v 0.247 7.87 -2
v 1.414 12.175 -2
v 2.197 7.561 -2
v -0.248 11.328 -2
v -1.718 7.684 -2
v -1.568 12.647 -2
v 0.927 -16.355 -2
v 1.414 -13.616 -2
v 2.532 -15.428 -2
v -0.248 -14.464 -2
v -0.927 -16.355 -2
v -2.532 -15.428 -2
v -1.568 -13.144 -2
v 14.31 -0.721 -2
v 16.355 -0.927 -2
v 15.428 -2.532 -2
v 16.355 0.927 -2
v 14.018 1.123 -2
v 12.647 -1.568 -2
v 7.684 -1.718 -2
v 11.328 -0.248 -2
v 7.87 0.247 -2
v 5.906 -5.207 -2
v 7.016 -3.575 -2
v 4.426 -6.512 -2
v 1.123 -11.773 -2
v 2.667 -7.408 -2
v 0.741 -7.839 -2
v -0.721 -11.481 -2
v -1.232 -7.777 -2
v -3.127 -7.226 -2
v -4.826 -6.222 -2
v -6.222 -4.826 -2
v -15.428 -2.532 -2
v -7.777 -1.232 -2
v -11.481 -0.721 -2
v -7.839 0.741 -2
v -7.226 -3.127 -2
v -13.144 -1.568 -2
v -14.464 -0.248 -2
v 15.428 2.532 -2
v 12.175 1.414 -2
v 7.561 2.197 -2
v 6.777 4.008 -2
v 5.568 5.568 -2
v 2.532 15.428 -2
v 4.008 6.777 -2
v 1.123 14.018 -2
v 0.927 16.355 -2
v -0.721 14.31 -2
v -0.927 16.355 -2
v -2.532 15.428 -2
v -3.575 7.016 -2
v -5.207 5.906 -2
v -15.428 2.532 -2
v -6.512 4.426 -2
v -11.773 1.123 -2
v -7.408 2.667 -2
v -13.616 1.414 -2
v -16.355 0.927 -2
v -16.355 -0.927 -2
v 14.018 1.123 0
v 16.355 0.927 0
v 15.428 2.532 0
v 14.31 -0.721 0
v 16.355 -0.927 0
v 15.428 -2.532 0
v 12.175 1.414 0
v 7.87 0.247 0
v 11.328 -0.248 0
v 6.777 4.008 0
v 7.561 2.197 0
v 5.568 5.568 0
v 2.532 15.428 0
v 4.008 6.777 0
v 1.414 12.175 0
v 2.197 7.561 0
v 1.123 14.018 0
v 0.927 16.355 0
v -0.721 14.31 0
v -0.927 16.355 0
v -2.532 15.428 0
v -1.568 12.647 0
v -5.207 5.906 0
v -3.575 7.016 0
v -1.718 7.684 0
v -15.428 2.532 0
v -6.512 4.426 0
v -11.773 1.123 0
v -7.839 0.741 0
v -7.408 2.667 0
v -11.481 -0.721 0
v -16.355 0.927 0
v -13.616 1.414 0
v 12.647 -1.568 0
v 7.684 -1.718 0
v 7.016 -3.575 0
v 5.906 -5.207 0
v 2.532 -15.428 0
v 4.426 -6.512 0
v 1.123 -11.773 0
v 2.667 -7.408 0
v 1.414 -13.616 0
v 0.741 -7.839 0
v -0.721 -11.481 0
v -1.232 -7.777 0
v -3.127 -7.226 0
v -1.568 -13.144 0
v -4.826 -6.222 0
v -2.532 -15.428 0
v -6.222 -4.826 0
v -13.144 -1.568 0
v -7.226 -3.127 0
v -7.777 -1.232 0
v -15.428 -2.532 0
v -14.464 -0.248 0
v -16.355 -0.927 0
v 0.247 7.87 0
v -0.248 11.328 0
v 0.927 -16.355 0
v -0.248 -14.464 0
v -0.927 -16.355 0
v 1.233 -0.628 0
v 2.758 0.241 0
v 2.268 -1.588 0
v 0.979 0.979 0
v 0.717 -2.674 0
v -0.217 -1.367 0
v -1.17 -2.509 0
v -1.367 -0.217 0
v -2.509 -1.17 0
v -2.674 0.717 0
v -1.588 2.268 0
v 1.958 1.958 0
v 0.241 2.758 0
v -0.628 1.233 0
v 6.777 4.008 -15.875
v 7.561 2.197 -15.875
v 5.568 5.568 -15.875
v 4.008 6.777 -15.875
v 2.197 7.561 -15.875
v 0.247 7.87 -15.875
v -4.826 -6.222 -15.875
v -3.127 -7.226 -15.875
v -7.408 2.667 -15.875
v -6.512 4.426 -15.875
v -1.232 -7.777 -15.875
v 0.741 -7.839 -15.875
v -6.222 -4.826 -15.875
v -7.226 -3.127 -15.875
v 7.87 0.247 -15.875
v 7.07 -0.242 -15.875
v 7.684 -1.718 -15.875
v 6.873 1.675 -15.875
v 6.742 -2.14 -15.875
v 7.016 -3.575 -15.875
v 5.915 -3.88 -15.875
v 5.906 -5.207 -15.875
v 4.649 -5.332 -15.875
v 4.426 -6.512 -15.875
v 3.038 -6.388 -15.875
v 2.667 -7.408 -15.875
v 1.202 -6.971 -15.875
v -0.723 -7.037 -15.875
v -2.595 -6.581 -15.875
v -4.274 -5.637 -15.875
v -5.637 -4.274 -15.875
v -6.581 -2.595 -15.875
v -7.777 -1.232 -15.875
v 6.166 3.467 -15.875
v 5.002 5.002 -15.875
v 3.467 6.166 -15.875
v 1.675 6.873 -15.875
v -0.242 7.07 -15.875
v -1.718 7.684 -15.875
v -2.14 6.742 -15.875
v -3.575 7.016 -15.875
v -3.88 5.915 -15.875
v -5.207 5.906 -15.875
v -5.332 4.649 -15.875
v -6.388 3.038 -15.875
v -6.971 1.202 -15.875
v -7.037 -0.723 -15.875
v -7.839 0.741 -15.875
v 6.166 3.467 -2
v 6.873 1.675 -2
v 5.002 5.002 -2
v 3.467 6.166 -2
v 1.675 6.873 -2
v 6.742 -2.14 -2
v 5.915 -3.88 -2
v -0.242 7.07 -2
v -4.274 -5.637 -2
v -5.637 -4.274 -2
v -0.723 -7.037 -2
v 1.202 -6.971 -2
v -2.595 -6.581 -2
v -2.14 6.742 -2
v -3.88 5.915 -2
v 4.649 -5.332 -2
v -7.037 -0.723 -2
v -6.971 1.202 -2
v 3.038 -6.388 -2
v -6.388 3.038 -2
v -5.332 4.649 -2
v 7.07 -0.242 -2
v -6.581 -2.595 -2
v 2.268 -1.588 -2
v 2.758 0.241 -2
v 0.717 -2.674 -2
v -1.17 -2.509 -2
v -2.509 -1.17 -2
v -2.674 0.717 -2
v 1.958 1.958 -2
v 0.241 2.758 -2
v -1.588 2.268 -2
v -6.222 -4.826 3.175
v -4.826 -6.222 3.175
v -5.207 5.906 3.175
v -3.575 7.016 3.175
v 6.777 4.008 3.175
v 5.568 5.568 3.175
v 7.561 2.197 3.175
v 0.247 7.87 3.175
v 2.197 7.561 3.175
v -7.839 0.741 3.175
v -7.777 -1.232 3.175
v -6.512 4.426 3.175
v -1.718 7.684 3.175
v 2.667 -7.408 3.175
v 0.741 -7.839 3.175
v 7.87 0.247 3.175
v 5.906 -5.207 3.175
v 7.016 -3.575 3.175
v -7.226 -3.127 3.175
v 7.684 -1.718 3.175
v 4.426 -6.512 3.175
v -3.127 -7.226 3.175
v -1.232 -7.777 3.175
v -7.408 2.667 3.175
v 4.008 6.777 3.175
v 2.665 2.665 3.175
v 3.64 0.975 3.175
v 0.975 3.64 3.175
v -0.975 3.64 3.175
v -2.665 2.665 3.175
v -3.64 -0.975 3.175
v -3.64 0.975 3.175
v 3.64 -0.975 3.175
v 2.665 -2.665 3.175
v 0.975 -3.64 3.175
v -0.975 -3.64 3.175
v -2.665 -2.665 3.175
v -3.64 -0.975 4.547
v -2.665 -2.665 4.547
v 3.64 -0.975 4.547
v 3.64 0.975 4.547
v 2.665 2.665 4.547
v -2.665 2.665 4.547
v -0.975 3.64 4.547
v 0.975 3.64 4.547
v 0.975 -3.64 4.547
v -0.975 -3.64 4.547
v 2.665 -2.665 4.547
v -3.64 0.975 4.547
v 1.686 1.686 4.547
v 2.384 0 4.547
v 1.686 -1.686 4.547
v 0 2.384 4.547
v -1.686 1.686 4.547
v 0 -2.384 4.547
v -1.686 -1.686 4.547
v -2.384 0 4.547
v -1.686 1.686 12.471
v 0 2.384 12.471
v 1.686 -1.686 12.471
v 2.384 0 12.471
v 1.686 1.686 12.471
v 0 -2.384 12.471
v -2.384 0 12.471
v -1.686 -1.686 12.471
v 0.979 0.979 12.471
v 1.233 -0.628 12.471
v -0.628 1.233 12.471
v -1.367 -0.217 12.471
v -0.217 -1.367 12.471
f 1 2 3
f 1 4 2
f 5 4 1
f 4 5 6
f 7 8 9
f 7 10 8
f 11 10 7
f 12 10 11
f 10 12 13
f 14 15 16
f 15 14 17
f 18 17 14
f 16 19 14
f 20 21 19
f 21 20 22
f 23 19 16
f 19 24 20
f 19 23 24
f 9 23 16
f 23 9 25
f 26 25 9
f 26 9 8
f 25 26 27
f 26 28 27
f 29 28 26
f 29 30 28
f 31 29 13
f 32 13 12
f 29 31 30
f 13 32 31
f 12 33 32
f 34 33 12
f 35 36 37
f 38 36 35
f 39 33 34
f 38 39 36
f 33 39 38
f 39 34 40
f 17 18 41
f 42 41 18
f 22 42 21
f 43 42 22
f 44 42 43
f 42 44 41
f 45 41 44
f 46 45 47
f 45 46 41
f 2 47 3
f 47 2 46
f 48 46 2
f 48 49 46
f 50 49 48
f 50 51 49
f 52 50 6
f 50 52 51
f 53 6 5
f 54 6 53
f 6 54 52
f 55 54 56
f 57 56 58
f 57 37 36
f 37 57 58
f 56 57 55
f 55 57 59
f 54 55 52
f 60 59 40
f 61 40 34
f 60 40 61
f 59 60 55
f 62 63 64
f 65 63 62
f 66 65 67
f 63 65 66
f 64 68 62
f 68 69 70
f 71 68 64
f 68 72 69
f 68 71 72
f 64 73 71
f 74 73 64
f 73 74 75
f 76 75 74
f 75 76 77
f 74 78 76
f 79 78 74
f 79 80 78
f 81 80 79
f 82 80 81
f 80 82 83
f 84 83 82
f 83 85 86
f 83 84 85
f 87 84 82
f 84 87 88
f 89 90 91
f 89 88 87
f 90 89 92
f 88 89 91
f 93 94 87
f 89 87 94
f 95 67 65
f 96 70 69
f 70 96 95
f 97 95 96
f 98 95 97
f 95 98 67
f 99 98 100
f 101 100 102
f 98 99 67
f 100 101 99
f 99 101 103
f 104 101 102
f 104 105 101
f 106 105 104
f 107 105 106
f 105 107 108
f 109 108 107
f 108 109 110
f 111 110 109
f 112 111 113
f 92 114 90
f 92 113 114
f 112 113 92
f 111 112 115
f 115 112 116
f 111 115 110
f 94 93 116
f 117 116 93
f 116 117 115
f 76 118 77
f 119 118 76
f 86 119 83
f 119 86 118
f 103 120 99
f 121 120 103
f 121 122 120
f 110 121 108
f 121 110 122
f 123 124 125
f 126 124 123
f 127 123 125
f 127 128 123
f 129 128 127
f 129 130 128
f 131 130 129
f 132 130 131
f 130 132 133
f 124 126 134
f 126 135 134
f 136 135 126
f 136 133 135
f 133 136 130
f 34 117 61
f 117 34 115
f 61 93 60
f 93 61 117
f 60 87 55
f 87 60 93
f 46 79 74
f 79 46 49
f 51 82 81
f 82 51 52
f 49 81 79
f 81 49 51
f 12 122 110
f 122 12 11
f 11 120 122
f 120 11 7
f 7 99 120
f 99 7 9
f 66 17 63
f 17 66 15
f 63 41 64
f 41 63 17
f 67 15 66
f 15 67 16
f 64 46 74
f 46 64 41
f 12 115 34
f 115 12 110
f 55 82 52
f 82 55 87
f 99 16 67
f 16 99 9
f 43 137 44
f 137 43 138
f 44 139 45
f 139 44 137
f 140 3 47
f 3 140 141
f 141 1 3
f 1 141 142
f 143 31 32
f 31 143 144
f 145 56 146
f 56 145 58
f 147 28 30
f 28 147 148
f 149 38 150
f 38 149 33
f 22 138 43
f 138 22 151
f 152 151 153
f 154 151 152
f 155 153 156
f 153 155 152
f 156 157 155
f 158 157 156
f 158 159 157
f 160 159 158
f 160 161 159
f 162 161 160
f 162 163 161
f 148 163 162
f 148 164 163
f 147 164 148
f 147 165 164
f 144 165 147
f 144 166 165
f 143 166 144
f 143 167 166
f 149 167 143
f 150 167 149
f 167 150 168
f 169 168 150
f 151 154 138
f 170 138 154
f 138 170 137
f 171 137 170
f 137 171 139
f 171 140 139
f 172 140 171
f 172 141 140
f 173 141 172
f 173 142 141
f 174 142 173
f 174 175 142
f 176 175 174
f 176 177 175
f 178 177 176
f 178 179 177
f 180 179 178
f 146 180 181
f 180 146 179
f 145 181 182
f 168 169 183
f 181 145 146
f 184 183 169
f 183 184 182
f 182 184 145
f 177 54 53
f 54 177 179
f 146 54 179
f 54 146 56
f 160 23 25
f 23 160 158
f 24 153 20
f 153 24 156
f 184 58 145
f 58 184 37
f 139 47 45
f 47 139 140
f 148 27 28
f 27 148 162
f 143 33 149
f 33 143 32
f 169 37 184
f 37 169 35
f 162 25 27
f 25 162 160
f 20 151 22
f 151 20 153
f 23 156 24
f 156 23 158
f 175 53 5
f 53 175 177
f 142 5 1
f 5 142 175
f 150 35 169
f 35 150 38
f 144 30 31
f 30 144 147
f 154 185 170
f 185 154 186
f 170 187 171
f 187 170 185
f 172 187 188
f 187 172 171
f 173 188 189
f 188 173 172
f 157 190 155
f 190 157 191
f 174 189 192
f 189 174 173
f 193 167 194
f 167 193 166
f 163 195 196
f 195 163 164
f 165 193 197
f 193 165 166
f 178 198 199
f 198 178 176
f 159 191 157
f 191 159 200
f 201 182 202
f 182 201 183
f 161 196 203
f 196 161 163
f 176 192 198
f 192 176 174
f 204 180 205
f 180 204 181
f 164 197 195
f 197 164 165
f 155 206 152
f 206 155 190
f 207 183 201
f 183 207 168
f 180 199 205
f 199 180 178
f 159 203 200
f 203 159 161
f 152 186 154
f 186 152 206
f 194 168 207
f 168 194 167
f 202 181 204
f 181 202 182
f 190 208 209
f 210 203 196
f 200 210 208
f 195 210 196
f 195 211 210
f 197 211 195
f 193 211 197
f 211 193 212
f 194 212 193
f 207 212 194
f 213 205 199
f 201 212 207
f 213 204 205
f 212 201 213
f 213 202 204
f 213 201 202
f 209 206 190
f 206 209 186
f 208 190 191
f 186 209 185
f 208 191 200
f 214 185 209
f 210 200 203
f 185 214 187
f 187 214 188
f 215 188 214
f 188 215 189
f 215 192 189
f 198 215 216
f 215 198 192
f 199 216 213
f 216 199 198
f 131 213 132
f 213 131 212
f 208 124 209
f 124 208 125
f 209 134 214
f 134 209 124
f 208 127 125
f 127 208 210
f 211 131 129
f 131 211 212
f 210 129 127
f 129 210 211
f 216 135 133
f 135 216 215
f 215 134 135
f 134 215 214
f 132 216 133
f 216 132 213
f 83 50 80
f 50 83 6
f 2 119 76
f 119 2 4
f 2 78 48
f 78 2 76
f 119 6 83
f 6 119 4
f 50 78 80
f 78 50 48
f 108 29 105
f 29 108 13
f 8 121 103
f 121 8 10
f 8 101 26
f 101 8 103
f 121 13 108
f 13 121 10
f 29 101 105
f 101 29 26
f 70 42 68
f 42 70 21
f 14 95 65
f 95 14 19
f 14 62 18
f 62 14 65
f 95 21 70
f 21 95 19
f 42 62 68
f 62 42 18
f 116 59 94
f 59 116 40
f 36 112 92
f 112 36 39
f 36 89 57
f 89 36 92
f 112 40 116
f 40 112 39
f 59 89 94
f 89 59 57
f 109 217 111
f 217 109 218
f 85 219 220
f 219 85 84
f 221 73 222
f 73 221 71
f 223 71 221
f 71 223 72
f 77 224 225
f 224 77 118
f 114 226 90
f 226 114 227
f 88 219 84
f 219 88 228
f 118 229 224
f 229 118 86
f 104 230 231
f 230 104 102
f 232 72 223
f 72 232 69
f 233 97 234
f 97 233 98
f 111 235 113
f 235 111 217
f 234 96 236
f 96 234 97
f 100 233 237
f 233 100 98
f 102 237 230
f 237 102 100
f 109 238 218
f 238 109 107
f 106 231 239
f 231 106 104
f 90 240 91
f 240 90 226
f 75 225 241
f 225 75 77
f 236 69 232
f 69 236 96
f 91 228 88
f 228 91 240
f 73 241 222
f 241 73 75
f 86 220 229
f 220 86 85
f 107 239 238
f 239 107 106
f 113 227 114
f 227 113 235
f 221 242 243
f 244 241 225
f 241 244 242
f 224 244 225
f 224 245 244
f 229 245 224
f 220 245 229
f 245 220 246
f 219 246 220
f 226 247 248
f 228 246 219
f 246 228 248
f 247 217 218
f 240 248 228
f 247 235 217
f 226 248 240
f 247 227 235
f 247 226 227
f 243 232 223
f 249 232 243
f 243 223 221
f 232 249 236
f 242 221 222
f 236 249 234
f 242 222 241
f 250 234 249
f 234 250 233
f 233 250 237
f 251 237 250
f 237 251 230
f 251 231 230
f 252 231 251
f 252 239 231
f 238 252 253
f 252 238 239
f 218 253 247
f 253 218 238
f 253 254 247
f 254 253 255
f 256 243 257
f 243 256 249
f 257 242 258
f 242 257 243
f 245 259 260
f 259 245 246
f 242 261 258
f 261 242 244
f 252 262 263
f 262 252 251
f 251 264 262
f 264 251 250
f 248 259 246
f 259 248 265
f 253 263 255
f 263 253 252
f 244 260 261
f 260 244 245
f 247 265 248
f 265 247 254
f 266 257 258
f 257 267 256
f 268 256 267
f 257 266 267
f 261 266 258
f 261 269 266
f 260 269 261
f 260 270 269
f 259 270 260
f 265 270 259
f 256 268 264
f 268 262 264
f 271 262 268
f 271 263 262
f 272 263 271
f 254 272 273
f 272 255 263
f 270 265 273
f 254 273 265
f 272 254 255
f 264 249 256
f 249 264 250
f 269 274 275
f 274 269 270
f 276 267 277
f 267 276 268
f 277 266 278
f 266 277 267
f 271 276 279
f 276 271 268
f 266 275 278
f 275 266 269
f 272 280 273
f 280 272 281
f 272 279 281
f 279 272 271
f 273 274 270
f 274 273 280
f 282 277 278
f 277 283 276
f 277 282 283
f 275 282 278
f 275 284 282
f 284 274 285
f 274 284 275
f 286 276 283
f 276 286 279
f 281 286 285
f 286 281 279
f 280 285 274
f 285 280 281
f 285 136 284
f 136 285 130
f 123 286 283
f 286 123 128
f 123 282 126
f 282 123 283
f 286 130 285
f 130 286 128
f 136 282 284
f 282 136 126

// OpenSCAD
so239_corner2corner = 25.4;
so239_width = 18.23720;
so239_thickness =2;
so239_rad = (so239_corner2corner - so239_width)/2;

antCyl_rad = 15.748/2;
antCyl_rad2 = 14.1478/2;
antCyl_height = 15.875;

so239_hole_rad = 3.175/2;

so239_wire_base_height2 = 1.3716;
so239_wire_base_rad2 = 2.7686 + 1;

so239_wire_conn_height = 7.9248-so239_wire_base_height2;

so239_wire_tip_height = 7.9248;
so239_wire_tip_rad = 2.7686/2 + 1;
so239_wire_hole = 2.7686/2;

so239_wire_base_height = 26.9748 - antCyl_height-so239_wire_base_height2-so239_wire_conn_height;


total_tip_height =so239_wire_base_height+so239_wire_base_height2+so239_wire_tip_height;

module p_so239_ant(){
    render()difference(){
    union(){
    cube([so239_width,so239_width,so239_thickness]);
   
        
    //curves
    translate([0,0,0])cylinder(h = so239_thickness, r =so239_rad);
    translate([so239_width,0,0])cylinder(h = so239_thickness, r =so239_rad);
    translate([0,so239_width,0])cylinder(h = so239_thickness, r =so239_rad);
    translate([so239_width,so239_width,0])cylinder(h = so239_thickness, r =so239_rad);
    //curves end
    
    translate([so239_width,0,0])cube([so239_rad,so239_width,so239_thickness]);
    translate([-so239_rad,0,0])cube([so239_rad,so239_width,so239_thickness]);
    
    translate([0,-so239_rad,0])cube([so239_width,so239_rad,so239_thickness]);
    
    translate([0,so239_width,0])cube([so239_width,so239_rad,so239_thickness]);
    
    
    translate([so239_width/2,so239_width/2,0])cylinder(h = antCyl_height, r = antCyl_rad);
    
        
    }
    //insert holes here
    translate([so239_width/2,so239_width/2,so239_thickness])cylinder(h = antCyl_height, r = antCyl_rad2);
    
    translate([so239_width/2,so239_width/2,0])cylinder(h = so239_thickness, r = 2.7686);
    
    translate([so239_width,0,0])cylinder(h = antCyl_height, r = so239_hole_rad);
    
    translate([0,so239_width,0])cylinder(h = antCyl_height, r = so239_hole_rad);
    
    translate([so239_width,so239_width,0])cylinder(h = antCyl_height, r = so239_hole_rad);
    
    translate([0,0,0])cylinder(h = antCyl_height, r = so239_hole_rad);
    
    //holes end
    }
}

module p_so239_wire(){
    render()difference(){
    union(){
    translate([so239_width/2,so239_width/2,-so239_wire_base_height])cylinder(h=so239_wire_base_height, r = antCyl_rad);
    
     translate([so239_width/2,so239_width/2,-so239_wire_base_height-so239_wire_base_height2])cylinder(h=so239_wire_base_height2, r = so239_wire_base_rad2);
    
     translate([so239_width/2,so239_width/2,-so239_wire_base_height-so239_wire_base_height2-so239_wire_tip_height])cylinder(h=so239_wire_tip_height, r = so239_wire_tip_rad);
    
    }
    
    translate([so239_width/2,so239_width/2,-so239_wire_base_height-so239_wire_base_height2-so239_wire_tip_height])cylinder(h=so239_wire_tip_height+so239_wire_base_height2+so239_wire_base_height, r = so239_wire_hole);
    }
}

module p_so239(){
    
    translate([-so239_width/2,so239_width/2,0])rotate(a=180, v = [1,0,0])color("gray")union(){
        p_so239_ant();
        p_so239_wire();
    }

}



module so239_mounting_pattern(){
    cylinder(h=10, r=16.6624/2);
    
    translate([18.2372/2,18.2372/2,0])cylinder(h=10, r=3.175/2, $fn = 12);
    
    translate([18.2372/2,-18.2372/2,0])cylinder(h=10, r=3.175/2, $fn = 12);
    
    translate([-18.2372/2,18.2372/2,0])cylinder(h=10, r=3.175/2, $fn = 12);
    
    translate([-18.2372/2,-18.2372/2,0])cylinder(h=10, r=3.175/2, $fn = 12);

}


rotate(a=45, v=[0,0,1])p_so239(); 
